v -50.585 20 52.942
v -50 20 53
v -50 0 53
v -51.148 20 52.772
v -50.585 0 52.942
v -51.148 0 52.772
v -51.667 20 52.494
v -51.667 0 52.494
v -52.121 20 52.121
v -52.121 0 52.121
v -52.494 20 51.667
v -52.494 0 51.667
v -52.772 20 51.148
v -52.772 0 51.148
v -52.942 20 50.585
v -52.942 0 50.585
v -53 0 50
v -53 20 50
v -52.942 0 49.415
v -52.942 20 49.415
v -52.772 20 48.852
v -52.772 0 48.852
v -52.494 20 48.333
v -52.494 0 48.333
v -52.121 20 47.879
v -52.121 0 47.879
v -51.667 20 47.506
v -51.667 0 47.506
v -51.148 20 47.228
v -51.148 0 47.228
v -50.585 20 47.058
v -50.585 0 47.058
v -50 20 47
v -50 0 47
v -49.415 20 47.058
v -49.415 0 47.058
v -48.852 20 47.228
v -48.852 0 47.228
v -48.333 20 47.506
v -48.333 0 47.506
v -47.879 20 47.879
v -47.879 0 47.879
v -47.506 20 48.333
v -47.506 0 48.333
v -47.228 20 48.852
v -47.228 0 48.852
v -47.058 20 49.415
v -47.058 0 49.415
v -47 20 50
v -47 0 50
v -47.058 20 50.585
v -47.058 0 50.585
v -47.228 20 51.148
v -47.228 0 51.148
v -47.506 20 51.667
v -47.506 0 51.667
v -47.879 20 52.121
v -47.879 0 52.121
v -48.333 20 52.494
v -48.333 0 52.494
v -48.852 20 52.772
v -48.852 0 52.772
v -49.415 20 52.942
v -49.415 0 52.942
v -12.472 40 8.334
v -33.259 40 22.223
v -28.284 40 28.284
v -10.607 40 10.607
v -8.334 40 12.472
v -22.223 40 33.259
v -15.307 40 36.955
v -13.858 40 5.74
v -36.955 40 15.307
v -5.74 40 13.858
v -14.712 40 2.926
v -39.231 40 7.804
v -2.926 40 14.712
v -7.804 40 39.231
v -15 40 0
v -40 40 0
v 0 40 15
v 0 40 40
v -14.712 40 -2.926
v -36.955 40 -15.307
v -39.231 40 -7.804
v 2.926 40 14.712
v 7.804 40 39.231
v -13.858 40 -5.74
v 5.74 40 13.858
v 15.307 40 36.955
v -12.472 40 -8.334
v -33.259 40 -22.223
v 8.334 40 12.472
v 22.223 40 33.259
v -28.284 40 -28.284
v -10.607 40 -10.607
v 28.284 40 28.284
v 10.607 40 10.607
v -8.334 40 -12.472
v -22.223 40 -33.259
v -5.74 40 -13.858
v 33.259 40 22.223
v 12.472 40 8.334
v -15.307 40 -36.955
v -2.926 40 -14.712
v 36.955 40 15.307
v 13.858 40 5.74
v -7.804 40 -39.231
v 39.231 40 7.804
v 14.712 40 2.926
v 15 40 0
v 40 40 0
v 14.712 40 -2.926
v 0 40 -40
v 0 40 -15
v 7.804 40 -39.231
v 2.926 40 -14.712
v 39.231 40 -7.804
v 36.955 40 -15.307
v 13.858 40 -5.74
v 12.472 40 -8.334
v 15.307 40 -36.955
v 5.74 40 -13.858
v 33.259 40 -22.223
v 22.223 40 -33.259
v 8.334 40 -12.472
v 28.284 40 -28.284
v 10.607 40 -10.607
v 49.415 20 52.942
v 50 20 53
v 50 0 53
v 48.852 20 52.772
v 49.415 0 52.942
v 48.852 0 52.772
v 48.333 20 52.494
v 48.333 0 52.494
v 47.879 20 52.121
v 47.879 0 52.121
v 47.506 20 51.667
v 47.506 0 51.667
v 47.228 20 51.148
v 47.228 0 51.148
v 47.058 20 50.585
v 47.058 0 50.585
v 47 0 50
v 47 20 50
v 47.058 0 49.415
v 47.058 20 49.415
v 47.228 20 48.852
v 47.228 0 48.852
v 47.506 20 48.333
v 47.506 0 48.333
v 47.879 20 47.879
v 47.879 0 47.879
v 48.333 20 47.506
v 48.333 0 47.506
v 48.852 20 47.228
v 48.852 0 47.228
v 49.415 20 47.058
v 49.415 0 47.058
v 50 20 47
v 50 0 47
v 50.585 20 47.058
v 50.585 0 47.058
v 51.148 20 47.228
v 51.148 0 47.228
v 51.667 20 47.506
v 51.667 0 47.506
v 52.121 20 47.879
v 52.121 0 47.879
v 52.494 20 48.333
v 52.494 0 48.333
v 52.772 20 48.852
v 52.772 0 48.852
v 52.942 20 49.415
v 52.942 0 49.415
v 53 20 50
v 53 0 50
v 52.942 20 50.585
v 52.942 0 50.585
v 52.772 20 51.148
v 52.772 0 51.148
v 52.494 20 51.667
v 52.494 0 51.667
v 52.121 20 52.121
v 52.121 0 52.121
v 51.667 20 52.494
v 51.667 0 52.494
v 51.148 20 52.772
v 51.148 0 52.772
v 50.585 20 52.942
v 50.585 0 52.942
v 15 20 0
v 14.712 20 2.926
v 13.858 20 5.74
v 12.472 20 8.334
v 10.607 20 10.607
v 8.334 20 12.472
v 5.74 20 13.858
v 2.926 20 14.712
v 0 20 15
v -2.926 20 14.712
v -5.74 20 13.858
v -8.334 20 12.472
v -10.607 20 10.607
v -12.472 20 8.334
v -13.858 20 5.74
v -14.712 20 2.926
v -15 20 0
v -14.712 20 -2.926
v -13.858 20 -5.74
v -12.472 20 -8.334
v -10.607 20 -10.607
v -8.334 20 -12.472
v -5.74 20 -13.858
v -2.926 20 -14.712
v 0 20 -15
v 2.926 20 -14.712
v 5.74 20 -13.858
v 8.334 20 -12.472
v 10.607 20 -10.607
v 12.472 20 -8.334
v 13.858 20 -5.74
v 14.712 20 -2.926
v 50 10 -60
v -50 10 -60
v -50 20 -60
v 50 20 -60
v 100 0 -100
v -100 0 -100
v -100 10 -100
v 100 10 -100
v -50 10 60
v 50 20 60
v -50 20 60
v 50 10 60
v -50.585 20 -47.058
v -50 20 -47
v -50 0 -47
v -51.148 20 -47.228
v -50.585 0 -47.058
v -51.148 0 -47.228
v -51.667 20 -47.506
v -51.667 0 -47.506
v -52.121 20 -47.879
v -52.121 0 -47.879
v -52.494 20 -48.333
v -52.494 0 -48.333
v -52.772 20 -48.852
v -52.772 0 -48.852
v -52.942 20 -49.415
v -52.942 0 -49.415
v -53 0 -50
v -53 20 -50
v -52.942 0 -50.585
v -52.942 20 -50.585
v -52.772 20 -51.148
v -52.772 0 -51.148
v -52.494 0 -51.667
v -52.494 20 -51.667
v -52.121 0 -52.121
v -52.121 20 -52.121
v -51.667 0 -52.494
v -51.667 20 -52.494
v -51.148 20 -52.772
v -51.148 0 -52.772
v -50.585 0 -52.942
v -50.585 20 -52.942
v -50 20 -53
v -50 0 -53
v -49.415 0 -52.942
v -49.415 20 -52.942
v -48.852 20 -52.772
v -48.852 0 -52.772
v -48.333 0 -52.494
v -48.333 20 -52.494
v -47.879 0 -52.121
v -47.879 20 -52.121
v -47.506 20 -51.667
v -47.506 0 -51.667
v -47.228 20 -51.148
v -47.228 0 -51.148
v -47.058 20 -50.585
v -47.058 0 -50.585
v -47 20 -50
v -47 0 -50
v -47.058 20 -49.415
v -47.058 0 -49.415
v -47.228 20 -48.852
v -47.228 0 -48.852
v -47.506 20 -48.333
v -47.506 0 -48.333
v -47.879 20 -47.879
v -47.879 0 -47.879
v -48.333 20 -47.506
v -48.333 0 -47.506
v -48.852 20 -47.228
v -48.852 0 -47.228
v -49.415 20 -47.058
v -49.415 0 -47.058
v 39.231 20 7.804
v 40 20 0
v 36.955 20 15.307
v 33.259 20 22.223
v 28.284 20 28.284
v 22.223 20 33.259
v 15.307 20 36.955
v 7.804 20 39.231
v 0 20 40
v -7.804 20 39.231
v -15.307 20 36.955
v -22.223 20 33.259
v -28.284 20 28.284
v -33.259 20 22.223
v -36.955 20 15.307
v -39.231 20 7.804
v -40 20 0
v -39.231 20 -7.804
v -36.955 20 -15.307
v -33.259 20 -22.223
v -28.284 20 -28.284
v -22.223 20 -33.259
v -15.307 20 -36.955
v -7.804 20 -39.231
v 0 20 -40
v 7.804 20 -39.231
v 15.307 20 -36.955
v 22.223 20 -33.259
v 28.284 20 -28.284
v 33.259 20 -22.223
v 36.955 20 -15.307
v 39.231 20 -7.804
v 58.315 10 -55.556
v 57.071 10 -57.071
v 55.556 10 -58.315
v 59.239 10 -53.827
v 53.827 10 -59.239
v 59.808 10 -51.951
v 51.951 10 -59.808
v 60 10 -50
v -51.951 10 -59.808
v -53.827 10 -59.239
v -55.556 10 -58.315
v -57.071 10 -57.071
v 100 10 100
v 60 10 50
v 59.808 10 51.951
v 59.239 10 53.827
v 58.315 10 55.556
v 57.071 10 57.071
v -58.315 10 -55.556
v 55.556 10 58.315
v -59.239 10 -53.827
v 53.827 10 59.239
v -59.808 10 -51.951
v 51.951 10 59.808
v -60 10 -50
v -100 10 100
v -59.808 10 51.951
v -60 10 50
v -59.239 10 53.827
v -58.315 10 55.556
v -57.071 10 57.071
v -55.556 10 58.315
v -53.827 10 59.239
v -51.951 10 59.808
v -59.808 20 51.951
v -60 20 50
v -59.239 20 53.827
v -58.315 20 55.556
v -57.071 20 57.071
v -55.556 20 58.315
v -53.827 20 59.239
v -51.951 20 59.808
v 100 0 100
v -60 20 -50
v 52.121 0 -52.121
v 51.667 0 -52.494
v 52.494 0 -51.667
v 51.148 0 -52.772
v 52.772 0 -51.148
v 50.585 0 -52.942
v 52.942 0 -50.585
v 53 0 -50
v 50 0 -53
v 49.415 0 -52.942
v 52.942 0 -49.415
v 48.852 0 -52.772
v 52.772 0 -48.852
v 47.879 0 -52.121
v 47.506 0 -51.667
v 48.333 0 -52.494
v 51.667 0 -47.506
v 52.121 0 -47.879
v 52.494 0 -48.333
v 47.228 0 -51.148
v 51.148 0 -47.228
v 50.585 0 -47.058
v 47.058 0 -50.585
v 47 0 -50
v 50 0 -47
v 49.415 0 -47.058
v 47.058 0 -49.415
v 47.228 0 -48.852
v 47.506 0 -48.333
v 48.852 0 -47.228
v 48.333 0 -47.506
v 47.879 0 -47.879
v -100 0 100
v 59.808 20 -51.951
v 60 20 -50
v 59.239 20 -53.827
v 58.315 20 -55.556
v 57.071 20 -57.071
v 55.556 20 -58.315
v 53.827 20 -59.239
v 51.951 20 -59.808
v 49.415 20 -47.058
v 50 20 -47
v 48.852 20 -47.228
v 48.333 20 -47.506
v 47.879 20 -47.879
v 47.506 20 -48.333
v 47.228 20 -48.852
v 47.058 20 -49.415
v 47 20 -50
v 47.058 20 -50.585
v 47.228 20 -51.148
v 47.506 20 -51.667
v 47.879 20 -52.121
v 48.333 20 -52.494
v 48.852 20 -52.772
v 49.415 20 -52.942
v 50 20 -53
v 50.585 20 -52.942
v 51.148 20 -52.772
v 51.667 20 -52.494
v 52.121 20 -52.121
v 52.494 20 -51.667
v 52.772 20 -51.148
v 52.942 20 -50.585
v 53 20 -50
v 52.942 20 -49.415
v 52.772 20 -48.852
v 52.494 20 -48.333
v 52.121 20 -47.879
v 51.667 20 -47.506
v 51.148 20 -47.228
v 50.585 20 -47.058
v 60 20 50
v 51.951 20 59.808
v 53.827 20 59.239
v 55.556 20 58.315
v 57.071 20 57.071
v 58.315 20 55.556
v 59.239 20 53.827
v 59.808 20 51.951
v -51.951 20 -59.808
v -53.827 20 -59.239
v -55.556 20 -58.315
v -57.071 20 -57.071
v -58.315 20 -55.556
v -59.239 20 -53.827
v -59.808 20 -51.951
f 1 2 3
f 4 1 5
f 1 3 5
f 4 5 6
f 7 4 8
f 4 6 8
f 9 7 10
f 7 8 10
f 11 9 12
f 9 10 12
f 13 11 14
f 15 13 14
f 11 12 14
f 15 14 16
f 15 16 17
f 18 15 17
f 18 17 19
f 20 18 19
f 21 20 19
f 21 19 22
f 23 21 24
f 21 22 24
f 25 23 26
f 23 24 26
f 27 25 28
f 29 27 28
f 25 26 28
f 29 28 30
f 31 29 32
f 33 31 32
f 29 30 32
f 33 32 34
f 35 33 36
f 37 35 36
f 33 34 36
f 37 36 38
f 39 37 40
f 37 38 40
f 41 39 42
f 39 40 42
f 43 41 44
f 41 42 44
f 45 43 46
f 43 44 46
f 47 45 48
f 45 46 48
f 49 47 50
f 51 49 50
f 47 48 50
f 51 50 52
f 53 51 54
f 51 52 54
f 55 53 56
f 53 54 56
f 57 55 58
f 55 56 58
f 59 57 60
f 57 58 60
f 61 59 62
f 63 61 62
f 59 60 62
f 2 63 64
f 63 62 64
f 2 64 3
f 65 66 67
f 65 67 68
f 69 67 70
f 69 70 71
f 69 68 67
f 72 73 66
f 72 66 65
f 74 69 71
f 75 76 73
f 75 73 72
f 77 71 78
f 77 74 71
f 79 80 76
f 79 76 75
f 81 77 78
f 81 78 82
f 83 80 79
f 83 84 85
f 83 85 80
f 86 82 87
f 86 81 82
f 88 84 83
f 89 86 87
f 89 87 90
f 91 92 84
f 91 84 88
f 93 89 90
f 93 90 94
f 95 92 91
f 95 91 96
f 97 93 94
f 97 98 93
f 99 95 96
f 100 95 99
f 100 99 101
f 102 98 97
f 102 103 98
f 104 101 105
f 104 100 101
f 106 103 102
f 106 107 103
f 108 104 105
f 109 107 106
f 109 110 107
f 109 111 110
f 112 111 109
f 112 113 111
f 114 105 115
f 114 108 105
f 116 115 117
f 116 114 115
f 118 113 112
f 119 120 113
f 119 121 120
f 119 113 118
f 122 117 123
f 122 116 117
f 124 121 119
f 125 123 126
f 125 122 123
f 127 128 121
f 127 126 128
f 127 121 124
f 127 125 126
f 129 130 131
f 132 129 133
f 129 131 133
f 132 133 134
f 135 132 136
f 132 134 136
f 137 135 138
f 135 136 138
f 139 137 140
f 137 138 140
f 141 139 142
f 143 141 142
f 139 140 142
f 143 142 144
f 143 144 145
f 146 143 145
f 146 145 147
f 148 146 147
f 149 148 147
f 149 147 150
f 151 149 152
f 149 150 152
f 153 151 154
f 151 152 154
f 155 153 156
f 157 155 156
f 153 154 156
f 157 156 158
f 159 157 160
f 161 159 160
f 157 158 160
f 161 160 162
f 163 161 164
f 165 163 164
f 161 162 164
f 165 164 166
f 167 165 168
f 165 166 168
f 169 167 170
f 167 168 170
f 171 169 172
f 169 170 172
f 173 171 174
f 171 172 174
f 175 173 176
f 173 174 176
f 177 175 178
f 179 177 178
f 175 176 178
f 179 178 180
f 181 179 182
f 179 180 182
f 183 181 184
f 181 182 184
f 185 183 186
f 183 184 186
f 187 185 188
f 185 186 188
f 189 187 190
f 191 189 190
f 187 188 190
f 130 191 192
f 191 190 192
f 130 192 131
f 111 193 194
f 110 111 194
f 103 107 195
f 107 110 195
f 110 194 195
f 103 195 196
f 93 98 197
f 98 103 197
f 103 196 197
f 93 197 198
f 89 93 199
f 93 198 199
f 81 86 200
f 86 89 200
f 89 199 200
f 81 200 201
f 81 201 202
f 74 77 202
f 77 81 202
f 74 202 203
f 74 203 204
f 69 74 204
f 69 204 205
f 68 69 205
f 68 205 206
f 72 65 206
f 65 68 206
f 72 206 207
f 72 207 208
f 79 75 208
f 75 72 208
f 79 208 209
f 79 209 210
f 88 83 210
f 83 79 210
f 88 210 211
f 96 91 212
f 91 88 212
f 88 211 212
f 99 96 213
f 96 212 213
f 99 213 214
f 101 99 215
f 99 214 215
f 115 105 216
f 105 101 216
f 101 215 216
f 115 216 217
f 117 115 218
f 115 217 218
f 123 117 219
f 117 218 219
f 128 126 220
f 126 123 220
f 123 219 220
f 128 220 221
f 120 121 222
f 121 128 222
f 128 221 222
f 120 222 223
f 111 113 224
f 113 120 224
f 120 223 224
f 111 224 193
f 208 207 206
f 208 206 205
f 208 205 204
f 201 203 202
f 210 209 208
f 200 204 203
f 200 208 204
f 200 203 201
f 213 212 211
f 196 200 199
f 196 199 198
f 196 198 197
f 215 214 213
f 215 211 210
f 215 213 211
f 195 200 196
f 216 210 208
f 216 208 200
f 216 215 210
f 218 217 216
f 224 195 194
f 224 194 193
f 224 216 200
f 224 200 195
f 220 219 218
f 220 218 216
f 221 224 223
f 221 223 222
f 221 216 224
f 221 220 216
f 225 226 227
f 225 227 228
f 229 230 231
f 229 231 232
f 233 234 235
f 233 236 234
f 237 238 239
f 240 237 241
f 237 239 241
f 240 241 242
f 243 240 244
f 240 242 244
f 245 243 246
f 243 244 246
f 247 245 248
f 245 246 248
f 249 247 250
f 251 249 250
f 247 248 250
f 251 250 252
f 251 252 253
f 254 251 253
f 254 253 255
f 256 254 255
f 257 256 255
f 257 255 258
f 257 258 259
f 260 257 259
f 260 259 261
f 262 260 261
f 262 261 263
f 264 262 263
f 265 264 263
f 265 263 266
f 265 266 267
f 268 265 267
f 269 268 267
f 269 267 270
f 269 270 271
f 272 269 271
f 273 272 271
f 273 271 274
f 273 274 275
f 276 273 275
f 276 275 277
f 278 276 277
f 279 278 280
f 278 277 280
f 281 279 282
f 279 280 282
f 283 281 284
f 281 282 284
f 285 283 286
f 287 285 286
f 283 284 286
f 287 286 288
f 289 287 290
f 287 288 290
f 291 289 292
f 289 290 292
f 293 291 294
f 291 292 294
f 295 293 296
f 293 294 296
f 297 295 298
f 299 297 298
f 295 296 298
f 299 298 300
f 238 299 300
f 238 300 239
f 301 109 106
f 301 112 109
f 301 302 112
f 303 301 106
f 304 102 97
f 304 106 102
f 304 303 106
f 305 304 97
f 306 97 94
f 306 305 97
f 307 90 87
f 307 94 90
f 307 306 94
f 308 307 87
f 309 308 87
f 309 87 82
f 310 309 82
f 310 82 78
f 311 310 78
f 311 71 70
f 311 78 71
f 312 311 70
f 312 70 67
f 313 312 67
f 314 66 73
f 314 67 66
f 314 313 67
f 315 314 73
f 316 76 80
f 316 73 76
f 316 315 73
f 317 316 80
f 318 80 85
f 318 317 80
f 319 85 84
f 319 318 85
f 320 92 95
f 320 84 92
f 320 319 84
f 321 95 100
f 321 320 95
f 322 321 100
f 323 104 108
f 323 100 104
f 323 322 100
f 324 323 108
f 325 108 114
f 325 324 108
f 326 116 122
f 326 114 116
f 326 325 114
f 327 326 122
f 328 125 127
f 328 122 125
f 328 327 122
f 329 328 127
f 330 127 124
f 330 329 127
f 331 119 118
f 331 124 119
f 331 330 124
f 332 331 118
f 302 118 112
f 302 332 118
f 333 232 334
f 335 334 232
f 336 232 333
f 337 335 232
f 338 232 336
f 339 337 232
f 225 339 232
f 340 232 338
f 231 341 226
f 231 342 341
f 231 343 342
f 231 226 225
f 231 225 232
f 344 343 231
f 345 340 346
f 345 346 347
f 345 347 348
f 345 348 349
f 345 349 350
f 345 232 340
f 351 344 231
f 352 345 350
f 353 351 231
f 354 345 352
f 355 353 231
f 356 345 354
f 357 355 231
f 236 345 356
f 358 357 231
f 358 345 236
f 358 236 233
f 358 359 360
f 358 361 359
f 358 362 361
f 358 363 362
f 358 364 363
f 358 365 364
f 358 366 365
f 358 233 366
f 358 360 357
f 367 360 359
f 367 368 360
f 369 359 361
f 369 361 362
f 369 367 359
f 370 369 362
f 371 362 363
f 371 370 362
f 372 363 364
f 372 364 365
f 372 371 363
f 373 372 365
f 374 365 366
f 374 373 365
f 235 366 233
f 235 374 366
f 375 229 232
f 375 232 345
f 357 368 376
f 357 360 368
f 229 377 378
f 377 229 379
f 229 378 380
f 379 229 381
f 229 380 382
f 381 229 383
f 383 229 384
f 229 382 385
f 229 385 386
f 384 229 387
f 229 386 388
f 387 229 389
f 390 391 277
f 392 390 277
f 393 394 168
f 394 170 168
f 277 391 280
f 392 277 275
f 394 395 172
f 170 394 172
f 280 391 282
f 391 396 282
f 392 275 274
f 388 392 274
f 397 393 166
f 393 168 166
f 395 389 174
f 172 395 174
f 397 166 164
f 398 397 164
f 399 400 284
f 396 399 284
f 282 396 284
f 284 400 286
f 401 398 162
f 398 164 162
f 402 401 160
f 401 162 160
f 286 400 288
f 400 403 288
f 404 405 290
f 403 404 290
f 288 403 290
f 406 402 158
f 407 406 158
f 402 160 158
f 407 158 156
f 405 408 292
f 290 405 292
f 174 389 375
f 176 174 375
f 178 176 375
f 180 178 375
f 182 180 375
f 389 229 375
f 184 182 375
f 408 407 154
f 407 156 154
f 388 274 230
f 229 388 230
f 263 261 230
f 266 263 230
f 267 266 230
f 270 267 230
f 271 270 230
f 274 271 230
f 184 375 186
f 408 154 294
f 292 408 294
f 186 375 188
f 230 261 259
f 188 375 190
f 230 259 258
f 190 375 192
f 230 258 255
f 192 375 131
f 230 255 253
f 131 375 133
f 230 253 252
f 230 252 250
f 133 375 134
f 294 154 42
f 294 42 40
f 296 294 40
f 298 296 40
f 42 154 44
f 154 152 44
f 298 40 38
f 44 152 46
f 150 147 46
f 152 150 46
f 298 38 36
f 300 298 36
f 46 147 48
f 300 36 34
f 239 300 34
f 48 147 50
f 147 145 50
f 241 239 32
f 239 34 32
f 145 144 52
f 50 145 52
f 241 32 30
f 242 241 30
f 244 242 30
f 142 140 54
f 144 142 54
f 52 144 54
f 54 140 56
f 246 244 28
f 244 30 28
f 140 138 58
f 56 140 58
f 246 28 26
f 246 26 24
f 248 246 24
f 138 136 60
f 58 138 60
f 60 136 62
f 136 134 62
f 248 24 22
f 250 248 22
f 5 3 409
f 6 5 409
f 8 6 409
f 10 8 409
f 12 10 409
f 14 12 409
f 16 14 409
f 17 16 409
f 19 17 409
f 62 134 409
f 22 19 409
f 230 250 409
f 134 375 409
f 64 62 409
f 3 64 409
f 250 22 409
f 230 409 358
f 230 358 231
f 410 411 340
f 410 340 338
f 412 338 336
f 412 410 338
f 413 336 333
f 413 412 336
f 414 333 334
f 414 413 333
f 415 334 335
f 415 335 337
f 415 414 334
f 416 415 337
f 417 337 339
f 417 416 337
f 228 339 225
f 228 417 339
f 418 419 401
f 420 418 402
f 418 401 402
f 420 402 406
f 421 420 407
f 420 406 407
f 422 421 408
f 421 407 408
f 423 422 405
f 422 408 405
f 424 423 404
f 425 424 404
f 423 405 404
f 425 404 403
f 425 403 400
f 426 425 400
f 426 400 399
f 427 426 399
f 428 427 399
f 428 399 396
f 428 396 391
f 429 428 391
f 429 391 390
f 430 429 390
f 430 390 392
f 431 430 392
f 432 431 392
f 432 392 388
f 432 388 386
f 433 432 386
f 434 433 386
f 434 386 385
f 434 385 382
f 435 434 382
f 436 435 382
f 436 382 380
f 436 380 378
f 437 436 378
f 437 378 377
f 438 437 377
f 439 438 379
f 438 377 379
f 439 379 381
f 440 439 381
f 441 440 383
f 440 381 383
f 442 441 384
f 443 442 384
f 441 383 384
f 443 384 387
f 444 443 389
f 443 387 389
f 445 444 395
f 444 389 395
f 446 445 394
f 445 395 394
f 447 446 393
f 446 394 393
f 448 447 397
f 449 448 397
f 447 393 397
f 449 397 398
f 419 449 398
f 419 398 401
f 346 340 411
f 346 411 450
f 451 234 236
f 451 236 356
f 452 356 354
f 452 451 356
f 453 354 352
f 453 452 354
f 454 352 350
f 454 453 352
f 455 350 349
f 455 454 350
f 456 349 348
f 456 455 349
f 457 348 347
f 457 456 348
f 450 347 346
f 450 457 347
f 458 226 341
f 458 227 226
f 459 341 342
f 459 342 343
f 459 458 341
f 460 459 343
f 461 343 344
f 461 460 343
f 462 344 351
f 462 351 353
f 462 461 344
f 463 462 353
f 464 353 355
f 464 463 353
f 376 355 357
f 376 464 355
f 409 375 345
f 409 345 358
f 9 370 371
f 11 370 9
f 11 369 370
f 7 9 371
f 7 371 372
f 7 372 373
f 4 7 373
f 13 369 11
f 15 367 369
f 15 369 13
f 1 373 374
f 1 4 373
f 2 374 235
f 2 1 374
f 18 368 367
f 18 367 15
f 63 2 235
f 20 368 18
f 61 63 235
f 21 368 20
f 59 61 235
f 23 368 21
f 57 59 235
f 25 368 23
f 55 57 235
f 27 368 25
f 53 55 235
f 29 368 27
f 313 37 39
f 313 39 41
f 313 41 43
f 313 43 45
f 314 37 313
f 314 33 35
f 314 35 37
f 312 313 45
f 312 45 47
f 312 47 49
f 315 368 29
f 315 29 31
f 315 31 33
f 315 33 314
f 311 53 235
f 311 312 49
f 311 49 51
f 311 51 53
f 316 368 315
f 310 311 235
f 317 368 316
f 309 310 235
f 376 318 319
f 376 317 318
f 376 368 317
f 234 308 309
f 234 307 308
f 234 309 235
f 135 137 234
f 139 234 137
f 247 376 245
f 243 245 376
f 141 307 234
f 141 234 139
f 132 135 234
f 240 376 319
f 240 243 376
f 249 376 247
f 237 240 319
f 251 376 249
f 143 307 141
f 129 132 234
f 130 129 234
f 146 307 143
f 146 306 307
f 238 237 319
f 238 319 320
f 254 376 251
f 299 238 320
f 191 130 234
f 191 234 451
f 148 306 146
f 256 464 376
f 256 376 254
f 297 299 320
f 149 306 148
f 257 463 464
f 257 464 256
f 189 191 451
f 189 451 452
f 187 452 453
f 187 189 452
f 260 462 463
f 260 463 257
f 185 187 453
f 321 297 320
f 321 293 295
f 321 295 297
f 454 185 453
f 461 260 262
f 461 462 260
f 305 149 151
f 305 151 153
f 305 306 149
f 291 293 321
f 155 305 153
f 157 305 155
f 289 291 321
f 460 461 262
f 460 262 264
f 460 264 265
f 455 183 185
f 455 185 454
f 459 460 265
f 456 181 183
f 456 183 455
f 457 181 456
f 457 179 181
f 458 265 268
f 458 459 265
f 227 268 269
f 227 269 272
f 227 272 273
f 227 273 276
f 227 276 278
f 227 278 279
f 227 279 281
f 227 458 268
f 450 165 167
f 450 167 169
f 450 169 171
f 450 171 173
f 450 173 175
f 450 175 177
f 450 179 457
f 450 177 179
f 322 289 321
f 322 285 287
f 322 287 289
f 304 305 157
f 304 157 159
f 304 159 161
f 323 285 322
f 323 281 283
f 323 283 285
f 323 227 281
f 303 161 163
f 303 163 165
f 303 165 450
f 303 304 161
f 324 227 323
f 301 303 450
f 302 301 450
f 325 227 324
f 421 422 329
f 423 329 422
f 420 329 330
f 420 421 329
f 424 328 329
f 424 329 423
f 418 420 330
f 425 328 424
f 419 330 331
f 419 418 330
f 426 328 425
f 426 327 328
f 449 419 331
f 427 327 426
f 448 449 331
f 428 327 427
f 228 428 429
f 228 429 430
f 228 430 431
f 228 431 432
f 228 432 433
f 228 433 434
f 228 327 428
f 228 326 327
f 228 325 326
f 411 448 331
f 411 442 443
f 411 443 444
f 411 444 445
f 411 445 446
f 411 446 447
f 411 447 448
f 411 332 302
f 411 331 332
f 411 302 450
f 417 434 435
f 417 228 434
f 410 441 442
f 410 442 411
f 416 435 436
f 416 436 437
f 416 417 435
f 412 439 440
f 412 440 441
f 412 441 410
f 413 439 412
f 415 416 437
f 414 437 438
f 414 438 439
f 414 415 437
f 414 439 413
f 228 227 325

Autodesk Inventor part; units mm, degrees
ref_plane "YZ Plane" through (0, 0, 0) normal (1, 0, 0) x (0, 1, 0)
ref_plane "XZ Plane" through (0, 0, 0) normal (0, 1, 0) x (-1, 0, 0)
ref_plane "XY Plane" through (0, 0, 0) normal (0, 0, 1) x (1, 0, 0)
sketch "Sketch1" plane through (0, 0, 0) normal (0, 1, 0) x (-1, 0, 0)
  line L0 (-100, 100) -> (100, 100)
  line L1 (100, 100) -> (100, -100)
  line L2 (100, -100) -> (-100, -100)
  line L3 (-100, -100) -> (-100, 100)
  line L4 (-100, 100) -> (100, -100) construction
  line L5 (100, 100) -> (-100, -100) construction
  point P0 (0, 0)
  dimension "d0" = 200
  dimension "d1" = 200
extrude "Extrusion1" add sketch "Sketch1" along normal blind 10
sketch "Sketch2" plane through (0, 10, 0) normal (0, 1, 0) x (1, 0, 0)
  line L0 (60, -60) -> (-60, -60)
  line L1 (-60, -60) -> (-60, 60)
  line L2 (-60, 60) -> (60, 60)
  line L3 (60, 60) -> (60, -60)
  line L4 (60, -60) -> (-60, 60) construction
  line L5 (-60, -60) -> (60, 60) construction
  point P0 (0, 0)
  dimension "d4" = 120
  dimension "d5" = 120
extrude "Extrusion2" add sketch "Sketch2" along normal blind 10
fillet "Fillet1" radius 10 4 edges at (60, 15, 60) (60, 15, -60) (-60, 15, 60) (-60, 15, -60)
sketch "Sketch3" plane through (0, 20, 0) normal (0, 1, 0) x (1, 0, 0)
  circle A0 centre (0, 0) radius 15
  circle A1 centre (0, 0) radius 40
  dimension "d9" = 30
  dimension "d19" = 80
extrude "Extrusion3" add sketch "Sketch3" along normal blind 20
sketch "Sketch4" plane through (0, 20, 0) normal (0, 1, 0) x (1, 0, 0)
  arc A0 (60, 50) -> (50, 60) centre (50, 50) ccw projected
  arc A1 (50, -60) -> (60, -50) centre (50, -50) ccw projected
  arc A2 (-60, -50) -> (-50, -60) centre (-50, -50) ccw projected
  arc A3 (-50, 60) -> (-60, 50) centre (-50, 50) ccw projected
  point P0 (0, 0)
hole "Hole1" at (50, 20, 50) at (-50, 20, 50) at (50, 20, -50) at (-50, 20, -50) direction (0, -1, 0) diameter 6 end through all
properties part number "Base Plate 2"
